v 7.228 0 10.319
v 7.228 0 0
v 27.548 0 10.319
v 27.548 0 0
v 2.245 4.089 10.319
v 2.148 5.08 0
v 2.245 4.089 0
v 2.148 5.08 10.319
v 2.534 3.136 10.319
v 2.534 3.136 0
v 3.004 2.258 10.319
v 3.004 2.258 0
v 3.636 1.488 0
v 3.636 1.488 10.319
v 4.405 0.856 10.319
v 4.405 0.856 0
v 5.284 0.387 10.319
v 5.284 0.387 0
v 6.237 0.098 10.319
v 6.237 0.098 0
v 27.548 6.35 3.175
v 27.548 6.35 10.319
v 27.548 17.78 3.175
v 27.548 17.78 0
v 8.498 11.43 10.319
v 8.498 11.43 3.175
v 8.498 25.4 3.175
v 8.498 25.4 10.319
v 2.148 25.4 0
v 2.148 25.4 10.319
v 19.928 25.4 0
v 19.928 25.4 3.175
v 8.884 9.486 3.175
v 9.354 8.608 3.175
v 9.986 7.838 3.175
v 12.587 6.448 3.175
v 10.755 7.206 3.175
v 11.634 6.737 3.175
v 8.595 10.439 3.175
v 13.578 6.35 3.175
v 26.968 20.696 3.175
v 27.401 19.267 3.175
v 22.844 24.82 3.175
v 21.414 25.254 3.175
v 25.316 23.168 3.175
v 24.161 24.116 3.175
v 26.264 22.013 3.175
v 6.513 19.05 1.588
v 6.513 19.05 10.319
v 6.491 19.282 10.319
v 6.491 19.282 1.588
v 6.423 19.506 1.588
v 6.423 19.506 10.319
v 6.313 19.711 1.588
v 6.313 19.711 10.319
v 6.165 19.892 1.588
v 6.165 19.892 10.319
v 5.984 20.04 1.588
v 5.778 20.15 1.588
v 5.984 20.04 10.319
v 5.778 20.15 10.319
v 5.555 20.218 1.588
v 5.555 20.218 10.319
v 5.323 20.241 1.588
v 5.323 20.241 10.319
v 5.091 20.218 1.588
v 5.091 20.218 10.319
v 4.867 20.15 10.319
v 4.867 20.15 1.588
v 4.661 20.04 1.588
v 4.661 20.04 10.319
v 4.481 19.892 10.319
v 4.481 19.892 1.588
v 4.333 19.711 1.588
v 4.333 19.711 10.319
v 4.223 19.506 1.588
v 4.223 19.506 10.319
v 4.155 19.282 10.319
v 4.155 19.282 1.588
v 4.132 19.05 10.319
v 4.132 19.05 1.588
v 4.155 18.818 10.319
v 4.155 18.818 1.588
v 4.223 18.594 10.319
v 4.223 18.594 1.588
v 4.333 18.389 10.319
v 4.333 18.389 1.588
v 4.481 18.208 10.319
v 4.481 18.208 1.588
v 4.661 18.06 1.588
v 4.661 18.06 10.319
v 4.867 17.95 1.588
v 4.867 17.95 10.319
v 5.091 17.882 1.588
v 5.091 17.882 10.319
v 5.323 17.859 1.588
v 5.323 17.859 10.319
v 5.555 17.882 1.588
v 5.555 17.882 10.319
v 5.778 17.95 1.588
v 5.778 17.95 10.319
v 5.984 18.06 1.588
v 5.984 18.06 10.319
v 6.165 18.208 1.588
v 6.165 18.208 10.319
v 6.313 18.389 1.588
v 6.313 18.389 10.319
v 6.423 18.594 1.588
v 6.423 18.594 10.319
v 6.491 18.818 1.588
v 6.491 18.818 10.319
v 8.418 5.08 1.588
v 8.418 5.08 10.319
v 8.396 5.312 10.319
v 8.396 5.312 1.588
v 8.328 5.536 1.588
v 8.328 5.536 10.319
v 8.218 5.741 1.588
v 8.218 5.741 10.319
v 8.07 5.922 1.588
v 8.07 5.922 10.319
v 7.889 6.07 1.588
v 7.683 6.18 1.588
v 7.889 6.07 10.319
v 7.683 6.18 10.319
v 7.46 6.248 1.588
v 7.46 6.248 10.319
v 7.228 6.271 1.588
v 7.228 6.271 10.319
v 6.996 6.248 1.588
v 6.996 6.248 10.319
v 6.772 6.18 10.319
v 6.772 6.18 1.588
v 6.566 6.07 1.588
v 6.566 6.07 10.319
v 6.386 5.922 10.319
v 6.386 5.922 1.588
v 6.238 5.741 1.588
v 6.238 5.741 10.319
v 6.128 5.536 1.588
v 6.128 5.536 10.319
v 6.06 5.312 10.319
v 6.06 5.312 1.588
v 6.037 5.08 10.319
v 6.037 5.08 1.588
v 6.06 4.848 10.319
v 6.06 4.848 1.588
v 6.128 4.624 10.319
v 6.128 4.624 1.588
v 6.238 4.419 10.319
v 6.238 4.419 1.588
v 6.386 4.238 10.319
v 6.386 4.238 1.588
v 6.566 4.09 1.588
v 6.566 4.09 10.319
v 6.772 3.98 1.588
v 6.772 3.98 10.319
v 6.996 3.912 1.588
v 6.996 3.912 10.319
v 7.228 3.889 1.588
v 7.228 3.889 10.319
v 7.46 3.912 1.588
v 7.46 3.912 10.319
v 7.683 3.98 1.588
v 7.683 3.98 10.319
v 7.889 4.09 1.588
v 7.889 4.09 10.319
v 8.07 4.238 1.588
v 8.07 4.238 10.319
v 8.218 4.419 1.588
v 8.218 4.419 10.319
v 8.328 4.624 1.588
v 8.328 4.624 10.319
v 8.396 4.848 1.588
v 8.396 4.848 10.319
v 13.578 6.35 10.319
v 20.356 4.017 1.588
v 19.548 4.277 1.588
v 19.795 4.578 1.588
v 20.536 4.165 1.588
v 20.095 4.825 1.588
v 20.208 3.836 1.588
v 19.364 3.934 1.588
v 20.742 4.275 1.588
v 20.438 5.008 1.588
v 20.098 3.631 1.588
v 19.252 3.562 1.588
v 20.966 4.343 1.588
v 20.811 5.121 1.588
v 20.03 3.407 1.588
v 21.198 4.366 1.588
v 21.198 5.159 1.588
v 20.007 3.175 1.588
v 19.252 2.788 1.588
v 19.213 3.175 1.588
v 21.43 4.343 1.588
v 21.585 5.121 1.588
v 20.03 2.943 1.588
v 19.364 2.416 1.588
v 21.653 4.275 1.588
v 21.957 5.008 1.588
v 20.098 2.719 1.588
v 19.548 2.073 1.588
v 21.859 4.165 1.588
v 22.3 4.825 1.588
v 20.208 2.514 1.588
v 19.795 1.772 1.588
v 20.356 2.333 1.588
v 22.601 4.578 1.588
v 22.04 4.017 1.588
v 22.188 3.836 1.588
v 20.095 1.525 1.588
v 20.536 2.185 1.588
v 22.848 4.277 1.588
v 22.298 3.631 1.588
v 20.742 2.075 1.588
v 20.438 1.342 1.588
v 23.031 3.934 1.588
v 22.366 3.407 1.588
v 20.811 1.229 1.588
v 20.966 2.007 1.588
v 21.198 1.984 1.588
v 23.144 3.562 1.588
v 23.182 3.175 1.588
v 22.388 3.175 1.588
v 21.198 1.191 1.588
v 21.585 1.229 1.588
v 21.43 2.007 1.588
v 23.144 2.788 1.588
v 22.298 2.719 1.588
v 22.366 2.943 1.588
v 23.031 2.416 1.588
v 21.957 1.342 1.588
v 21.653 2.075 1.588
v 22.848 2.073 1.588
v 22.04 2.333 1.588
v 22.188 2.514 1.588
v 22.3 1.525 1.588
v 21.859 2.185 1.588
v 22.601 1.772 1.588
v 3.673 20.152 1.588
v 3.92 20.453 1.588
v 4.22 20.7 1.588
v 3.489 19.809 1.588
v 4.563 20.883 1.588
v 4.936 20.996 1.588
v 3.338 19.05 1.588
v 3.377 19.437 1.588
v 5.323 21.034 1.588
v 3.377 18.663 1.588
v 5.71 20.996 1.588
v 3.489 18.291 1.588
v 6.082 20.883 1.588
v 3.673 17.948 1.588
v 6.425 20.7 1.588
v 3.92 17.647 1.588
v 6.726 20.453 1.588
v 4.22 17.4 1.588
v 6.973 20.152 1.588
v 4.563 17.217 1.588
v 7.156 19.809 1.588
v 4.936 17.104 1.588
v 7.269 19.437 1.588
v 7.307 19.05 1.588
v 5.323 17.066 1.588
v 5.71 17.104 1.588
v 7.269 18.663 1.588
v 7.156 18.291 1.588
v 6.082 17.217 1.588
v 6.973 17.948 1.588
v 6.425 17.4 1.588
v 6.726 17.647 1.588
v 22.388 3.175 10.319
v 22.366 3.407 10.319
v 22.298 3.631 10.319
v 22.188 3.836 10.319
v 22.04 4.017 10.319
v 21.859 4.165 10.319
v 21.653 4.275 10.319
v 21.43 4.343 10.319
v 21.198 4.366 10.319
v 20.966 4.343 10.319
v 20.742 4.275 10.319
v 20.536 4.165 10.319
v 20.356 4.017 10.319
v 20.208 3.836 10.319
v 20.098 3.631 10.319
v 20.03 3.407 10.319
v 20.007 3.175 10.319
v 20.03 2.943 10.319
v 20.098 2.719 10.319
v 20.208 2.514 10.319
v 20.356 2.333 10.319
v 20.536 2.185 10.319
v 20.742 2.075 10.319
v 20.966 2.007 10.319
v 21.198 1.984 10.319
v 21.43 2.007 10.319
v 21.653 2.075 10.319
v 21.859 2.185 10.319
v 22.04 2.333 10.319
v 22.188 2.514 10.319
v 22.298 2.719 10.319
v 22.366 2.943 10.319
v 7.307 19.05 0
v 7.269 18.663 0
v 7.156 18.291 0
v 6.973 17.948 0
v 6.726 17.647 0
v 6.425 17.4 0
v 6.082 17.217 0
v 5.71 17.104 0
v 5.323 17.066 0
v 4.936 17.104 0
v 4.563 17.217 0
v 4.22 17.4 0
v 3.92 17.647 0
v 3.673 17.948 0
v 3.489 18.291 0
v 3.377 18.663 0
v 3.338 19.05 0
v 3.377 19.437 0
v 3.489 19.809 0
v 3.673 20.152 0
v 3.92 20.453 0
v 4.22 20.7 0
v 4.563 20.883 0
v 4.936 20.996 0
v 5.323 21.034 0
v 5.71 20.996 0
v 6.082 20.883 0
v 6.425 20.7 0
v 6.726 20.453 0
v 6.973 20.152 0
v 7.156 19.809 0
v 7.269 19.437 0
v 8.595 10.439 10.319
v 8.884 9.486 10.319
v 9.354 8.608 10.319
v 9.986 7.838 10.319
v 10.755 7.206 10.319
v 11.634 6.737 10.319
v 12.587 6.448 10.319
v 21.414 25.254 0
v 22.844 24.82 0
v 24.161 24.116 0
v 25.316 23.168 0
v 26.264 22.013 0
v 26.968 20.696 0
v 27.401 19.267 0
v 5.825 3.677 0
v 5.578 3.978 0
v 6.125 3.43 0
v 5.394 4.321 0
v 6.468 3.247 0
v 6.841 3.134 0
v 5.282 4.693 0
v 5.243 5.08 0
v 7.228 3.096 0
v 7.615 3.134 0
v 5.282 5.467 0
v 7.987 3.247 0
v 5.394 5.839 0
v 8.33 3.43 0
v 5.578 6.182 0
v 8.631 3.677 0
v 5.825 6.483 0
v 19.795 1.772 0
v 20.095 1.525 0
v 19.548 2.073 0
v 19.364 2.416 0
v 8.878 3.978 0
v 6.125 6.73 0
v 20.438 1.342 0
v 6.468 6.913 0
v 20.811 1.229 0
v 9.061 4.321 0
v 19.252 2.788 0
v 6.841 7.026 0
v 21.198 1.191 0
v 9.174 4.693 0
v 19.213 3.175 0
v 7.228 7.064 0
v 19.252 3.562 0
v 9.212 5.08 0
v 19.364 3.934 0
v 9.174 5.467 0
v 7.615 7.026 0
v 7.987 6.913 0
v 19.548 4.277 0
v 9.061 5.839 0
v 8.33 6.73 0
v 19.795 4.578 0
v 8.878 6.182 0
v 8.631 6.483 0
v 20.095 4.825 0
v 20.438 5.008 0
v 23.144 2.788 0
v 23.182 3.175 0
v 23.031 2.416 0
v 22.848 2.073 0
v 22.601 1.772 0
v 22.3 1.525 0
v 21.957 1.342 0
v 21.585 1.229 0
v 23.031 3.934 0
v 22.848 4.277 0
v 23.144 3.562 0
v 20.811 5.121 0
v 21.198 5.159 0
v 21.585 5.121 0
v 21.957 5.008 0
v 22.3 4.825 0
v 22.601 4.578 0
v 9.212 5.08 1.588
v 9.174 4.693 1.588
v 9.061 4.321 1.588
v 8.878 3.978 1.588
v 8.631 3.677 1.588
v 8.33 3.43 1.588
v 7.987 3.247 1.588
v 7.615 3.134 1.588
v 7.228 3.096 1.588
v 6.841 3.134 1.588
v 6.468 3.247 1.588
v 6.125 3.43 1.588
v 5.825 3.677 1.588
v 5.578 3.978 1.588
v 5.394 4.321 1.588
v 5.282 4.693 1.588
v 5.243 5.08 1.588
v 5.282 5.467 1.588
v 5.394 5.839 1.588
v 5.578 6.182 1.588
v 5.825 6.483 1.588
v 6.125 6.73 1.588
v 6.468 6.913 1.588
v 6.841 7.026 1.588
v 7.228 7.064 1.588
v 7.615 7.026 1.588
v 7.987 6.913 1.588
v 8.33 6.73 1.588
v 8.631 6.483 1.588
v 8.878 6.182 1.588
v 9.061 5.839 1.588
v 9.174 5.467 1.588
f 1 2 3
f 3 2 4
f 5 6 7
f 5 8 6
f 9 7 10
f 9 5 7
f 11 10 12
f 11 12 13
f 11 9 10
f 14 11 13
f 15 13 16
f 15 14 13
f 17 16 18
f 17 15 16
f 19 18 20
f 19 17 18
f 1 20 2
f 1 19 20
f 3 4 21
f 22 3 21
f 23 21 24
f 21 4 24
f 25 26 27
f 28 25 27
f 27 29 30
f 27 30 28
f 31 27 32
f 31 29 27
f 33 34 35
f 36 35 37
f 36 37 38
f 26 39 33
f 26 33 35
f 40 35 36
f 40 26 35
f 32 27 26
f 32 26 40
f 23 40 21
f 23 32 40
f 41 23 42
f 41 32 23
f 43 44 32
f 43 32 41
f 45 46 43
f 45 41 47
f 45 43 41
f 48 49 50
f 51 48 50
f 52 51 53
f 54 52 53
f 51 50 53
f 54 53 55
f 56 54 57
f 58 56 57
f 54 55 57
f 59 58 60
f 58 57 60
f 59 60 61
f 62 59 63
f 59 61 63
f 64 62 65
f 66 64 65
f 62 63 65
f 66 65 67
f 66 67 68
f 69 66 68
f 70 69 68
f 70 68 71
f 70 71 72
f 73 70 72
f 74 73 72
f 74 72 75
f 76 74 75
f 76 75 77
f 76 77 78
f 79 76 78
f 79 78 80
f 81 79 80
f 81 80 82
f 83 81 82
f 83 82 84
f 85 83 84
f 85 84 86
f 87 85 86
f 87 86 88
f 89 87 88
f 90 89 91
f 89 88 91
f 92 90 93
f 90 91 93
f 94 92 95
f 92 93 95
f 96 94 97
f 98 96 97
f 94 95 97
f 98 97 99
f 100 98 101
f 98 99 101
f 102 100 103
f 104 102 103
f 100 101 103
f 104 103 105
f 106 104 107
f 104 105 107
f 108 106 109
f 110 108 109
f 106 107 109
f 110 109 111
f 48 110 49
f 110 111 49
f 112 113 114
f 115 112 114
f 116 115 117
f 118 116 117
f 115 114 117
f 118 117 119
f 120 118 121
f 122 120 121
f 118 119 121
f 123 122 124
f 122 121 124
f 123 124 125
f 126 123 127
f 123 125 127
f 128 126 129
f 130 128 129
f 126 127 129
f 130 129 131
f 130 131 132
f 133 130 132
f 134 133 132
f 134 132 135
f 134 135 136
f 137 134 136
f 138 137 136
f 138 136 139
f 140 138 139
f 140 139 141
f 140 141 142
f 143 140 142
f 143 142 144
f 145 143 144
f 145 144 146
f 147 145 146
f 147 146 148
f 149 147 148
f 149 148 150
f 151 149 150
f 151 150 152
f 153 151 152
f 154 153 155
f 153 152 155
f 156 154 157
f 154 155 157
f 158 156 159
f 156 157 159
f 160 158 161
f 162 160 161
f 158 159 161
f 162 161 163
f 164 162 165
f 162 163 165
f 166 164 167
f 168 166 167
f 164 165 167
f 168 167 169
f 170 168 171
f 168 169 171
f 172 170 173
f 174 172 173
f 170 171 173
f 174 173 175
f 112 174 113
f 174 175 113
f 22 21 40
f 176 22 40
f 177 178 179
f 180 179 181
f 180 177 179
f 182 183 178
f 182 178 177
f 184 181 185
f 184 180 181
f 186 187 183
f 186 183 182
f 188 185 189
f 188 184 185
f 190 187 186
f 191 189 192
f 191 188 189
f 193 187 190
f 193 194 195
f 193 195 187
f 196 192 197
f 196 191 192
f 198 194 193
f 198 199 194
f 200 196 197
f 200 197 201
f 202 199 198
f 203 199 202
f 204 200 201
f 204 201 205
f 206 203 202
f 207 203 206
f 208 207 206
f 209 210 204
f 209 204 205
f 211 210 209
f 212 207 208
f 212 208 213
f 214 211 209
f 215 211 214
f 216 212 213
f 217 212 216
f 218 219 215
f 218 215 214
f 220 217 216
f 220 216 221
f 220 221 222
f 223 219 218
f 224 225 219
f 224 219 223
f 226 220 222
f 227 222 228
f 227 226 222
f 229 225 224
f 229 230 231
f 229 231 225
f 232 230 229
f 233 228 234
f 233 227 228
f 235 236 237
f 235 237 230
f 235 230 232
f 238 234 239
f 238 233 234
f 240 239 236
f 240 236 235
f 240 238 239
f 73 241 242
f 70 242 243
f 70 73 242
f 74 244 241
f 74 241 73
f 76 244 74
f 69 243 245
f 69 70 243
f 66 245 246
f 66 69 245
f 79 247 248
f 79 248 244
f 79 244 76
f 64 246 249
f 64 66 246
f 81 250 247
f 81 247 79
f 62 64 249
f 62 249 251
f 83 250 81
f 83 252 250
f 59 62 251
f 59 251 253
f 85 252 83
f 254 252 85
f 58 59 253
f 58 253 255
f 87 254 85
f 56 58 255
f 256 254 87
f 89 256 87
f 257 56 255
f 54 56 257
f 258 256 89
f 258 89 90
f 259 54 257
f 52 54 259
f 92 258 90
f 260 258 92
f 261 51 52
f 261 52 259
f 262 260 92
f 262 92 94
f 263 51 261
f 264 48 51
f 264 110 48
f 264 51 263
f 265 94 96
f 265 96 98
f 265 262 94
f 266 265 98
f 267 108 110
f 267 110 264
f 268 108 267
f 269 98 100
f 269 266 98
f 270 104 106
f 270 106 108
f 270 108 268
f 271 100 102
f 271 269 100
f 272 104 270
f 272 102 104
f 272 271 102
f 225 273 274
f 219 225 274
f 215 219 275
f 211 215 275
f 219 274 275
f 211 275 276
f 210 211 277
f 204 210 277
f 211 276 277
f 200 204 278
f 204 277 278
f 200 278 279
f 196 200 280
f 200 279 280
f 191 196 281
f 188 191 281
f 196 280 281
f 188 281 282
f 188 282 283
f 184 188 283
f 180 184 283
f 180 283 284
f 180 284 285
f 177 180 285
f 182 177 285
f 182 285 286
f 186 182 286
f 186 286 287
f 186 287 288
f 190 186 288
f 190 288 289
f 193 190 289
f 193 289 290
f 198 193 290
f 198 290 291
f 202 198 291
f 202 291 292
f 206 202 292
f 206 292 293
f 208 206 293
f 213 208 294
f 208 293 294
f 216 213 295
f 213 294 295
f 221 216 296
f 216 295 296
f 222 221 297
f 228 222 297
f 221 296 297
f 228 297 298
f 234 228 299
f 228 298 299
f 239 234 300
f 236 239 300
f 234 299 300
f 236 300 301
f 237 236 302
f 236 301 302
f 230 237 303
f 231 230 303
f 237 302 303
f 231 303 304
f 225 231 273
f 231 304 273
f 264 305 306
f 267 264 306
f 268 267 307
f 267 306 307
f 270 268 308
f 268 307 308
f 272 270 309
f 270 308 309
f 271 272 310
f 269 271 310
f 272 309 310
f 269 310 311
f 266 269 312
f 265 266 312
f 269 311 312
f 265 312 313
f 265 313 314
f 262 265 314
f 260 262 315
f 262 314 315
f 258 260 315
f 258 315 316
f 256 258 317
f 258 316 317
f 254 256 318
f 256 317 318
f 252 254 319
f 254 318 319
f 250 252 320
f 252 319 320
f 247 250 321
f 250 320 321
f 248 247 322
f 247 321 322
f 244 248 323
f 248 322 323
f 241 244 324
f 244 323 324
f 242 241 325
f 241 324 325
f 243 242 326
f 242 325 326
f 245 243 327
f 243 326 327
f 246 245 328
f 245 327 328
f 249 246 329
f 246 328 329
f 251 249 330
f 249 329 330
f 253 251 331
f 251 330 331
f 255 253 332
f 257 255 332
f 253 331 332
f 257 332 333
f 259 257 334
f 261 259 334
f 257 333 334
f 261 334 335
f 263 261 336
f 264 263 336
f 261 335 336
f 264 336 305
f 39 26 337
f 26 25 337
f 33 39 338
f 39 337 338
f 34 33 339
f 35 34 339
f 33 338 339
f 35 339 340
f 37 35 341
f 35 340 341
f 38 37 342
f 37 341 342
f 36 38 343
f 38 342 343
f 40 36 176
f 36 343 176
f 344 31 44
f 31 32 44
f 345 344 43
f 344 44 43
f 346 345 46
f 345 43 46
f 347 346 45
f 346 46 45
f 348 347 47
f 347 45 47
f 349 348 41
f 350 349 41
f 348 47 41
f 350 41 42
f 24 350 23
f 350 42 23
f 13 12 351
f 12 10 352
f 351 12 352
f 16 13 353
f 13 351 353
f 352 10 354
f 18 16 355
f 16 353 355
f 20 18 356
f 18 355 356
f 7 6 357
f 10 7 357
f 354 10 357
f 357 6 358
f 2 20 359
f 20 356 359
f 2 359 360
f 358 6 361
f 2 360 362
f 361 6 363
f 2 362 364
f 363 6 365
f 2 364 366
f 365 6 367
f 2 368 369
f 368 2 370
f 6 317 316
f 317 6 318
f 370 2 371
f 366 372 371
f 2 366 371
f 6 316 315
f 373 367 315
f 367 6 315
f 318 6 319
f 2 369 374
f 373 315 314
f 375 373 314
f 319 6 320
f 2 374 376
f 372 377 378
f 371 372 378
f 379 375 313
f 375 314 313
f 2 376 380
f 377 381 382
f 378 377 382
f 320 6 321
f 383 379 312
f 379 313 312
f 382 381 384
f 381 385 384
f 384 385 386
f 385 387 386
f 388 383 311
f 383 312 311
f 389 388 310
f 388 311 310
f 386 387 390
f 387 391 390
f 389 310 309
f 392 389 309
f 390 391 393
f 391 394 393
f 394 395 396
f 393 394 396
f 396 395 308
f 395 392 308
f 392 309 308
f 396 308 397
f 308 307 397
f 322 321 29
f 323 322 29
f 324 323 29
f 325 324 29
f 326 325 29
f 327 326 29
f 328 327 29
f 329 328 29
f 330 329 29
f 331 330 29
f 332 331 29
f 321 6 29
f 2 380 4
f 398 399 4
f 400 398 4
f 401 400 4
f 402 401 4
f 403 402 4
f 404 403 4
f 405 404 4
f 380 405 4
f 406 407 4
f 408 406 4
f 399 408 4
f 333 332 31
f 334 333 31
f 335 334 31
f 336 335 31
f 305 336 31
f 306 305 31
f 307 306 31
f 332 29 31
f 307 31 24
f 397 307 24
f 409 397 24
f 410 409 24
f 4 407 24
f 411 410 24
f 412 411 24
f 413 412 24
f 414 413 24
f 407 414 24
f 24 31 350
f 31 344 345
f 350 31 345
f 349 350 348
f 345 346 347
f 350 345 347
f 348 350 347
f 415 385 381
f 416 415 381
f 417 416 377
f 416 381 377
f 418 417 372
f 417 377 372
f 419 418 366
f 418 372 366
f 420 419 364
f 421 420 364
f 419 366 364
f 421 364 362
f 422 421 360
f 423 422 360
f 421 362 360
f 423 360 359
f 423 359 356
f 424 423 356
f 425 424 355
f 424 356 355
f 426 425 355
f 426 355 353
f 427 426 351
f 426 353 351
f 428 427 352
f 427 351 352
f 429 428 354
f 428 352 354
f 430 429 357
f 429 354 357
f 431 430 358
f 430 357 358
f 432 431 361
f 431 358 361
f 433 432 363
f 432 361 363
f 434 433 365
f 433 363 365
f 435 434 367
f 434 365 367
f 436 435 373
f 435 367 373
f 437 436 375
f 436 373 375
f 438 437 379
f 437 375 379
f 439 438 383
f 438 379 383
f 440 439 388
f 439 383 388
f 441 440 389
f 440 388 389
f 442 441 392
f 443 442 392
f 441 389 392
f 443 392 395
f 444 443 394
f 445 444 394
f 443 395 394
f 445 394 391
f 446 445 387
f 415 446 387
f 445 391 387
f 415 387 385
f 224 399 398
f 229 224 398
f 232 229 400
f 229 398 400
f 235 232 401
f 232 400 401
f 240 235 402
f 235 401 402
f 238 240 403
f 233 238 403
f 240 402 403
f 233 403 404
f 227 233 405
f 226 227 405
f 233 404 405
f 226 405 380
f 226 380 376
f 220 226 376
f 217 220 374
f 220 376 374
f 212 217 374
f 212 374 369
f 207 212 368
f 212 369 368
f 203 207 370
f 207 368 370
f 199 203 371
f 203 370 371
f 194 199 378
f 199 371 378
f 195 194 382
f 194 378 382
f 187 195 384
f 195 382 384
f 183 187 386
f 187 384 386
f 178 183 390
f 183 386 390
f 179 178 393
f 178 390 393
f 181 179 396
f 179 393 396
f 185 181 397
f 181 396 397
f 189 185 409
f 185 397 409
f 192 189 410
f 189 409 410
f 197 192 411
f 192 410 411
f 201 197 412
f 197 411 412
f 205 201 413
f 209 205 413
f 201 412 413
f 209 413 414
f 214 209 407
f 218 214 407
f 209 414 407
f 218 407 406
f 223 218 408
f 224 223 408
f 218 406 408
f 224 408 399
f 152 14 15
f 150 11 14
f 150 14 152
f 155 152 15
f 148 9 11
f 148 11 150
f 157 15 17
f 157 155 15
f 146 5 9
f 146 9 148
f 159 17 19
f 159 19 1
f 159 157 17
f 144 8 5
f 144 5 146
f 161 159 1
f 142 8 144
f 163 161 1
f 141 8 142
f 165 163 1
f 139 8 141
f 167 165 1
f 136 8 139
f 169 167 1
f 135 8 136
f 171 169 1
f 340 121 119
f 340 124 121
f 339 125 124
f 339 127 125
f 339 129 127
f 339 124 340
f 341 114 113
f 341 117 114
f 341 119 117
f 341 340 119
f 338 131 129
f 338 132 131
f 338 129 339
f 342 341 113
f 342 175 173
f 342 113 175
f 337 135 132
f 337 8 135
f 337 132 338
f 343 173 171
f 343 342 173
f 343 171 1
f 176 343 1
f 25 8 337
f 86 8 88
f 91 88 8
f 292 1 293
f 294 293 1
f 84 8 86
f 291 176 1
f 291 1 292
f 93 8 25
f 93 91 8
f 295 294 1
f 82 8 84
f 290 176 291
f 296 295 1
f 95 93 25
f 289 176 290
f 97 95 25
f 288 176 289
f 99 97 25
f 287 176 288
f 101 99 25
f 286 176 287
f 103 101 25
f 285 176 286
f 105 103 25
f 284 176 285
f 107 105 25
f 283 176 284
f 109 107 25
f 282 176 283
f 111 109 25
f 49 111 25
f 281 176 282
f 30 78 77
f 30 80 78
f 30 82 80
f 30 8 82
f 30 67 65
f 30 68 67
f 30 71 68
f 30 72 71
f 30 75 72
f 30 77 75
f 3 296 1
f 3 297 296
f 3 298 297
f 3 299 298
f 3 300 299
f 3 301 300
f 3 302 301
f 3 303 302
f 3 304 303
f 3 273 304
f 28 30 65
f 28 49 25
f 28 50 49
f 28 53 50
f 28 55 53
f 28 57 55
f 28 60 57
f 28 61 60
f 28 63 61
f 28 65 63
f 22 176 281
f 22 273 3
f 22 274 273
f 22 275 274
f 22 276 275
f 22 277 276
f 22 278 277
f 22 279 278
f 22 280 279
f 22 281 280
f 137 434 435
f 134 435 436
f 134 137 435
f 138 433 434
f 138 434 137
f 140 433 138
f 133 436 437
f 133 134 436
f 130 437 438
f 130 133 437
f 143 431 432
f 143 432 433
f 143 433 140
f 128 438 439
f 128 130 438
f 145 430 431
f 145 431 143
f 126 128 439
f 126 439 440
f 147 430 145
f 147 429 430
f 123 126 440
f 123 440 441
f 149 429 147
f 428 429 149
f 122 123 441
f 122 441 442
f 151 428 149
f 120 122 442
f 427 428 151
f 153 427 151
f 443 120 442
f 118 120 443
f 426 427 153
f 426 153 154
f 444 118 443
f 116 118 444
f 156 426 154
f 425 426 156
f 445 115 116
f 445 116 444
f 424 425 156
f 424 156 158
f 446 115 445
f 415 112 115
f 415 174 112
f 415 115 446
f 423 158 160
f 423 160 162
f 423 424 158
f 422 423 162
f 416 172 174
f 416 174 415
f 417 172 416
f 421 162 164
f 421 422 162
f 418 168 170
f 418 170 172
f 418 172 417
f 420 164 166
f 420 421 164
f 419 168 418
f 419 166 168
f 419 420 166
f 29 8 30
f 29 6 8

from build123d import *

# Parameters (mm, degrees)
F0_W     = 25.4
F0_H     = 25.4
F1_DEPTH = 3.175
F3_DEPTH = 10.31875
F4_R     = 5.08
F5_R     = 7.62
F6_R     = 1.190625
F7_DEPTH = 10.31975
F8_R     = 1.984375
F9_DEPTH = 1.5875


with BuildPart() as f1:
    # F0 (on Top) → F1 (new body)
    with BuildSketch(Plane.XY):
        with Locations((14.847793, 12.7)):
            Rectangle(F0_W, F0_H)
    extrude(amount=F1_DEPTH)

    # F2 (on Top) → F3 (join)
    with BuildSketch(Plane.XY):
        Polygon((2.147793, 6.35), (2.147793, 0), (8.497793, 0), (27.547793, 0), (27.547793, 6.35), (8.497793, 6.35), (8.497793, 25.4), (2.147793, 25.4), align=None)
    extrude(amount=F3_DEPTH)

    # F4
    f4_edges = [f1.edges().sort_by_distance(p)[0] for p in [
        (8.497793, 6.35, 6.746875),
        (2.147793, 0, 5.159375),
    ]]
    fillet(f4_edges, radius=F4_R)

    # F5
    f5_edges = [f1.edges().sort_by_distance(p)[0] for p in [
        (27.547793, 25.4, 1.5875),
    ]]
    fillet(f5_edges, radius=F5_R)

    # F6 (on face) → F7 (cut, through all)
    with BuildSketch(Plane.XY.offset(10.31875)):
        with Locations((7.227793, 5.08)):
            Circle(F6_R)
        with Locations((5.322793, 19.05)):
            Circle(F6_R)
        with Locations((21.197793, 3.175)):
            Circle(F6_R)
    extrude(amount=-F7_DEPTH, mode=Mode.SUBTRACT)

    # F8 (on face) → F9 (cut)
    with BuildSketch(Plane(origin=(0, 0, 0), x_dir=(1, 0, 0), z_dir=(0, 0, -1))):
        with Locations((7.227793, -5.08)):
            Circle(F8_R)
        with Locations((21.197793, -3.175)):
            Circle(F8_R)
        with Locations((5.322793, -19.05)):
            Circle(F8_R)
    extrude(amount=-F9_DEPTH, mode=Mode.SUBTRACT)


solid = f1.part
